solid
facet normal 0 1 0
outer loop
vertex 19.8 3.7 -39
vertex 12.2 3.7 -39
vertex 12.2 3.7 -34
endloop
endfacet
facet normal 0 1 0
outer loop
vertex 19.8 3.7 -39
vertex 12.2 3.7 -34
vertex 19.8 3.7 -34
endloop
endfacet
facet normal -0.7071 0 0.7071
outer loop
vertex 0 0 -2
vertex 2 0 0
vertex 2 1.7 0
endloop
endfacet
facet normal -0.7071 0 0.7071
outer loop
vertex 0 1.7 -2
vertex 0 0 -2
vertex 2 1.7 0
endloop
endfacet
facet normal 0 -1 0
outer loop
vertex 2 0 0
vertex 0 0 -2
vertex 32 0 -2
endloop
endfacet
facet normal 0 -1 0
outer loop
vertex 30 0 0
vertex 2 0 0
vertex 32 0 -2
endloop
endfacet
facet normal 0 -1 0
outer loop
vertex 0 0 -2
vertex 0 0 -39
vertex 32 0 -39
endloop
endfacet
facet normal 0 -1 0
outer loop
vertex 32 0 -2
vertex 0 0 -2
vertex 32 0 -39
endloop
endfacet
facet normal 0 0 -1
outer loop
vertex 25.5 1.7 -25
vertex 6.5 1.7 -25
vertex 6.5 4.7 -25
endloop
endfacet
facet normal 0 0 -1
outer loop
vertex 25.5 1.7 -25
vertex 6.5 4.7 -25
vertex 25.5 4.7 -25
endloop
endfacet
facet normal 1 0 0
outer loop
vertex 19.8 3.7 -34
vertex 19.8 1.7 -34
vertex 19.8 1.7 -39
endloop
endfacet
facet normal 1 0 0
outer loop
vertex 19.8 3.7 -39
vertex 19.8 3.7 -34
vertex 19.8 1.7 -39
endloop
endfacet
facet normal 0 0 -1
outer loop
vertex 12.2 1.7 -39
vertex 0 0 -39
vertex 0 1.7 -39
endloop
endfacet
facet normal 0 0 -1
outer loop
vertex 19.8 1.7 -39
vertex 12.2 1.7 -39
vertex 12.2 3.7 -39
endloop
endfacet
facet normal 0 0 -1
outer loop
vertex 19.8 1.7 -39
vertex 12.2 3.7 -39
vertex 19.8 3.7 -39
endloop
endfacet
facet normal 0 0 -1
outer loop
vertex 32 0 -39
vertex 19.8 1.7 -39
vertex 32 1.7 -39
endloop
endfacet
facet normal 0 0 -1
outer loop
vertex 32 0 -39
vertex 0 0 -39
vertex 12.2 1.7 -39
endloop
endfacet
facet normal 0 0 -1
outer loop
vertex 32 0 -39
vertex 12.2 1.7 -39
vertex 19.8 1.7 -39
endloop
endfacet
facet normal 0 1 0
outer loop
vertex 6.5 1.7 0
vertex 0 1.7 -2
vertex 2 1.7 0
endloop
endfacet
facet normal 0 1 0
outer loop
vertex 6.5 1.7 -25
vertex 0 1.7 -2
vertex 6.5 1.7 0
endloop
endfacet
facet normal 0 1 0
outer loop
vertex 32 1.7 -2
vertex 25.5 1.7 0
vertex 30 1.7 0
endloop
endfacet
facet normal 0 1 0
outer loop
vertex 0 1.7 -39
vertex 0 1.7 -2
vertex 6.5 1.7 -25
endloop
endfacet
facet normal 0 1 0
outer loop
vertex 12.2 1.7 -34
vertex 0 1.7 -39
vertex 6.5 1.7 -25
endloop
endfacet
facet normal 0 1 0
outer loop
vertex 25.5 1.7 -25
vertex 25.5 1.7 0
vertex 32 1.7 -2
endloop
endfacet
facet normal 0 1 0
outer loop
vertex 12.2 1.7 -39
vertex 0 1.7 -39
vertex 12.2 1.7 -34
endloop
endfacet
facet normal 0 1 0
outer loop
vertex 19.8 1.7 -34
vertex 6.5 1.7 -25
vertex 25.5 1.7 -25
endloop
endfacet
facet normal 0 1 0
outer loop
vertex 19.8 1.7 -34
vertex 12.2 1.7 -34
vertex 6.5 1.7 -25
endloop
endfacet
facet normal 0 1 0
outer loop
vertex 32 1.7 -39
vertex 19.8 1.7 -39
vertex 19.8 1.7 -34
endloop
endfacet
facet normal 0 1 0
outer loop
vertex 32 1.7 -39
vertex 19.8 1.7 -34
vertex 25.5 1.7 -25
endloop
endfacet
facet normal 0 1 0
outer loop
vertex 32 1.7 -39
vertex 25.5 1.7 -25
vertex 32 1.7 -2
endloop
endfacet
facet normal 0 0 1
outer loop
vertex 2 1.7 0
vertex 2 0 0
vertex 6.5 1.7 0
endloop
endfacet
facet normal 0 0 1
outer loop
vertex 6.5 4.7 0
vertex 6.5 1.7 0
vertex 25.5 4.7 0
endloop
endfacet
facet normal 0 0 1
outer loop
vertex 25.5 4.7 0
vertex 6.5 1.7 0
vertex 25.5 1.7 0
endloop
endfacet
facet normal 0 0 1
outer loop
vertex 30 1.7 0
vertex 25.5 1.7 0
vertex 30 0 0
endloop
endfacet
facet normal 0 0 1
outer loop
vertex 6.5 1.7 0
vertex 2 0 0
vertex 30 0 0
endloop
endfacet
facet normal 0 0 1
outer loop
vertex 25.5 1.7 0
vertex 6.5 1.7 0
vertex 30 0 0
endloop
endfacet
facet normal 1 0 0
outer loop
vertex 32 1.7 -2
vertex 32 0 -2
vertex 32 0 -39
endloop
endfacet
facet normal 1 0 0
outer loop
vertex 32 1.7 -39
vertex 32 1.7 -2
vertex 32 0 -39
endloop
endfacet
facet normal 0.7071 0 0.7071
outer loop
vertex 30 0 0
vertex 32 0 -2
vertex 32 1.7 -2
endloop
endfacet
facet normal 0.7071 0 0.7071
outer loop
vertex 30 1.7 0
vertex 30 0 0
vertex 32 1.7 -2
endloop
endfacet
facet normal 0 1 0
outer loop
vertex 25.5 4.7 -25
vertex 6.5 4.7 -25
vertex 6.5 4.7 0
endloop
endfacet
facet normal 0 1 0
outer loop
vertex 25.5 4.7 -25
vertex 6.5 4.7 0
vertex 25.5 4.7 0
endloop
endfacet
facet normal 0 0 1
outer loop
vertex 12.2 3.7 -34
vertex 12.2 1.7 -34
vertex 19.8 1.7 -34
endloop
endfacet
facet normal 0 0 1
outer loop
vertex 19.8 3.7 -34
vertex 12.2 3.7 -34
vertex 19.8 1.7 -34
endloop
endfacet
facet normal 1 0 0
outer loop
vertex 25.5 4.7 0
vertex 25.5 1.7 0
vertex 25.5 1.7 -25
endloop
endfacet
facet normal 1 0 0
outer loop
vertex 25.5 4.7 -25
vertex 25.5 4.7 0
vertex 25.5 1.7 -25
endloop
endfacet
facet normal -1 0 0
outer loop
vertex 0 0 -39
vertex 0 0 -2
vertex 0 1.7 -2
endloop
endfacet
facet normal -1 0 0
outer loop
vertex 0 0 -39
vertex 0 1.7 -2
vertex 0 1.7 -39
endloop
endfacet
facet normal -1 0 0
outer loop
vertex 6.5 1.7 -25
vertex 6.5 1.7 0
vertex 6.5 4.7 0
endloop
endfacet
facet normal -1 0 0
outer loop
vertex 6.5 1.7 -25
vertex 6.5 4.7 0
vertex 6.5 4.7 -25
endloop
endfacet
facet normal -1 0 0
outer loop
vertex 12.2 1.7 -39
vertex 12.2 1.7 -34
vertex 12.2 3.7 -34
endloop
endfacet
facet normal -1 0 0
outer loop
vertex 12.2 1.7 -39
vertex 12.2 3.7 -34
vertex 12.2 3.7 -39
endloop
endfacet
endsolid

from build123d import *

# Parameters (mm, degrees)
SKETCH1_W           = 32
SKETCH1_H           = 39
BOSS_EXTRUDE1_DEPTH = 1.7
CHAMFER1_SIZE       = 2
SKETCH3_W           = 19
SKETCH3_H           = 25
BOSS_EXTRUDE2_DEPTH = 3
SKETCH4_W           = 7.6
SKETCH4_H           = 5
BOSS_EXTRUDE3_DEPTH = 2


with BuildPart() as part:
    # Sketch1 → Boss-Extrude1 (new body)
    with BuildSketch(Plane(origin=(0, 0, 0), x_dir=(1, 0, 0), z_dir=(0, 1, 0))):
        with Locations((16, 19.5)):
            Rectangle(SKETCH1_W, SKETCH1_H)
    extrude(amount=BOSS_EXTRUDE1_DEPTH)

    # Chamfer1
    chamfer1_edges = [part.edges().sort_by_distance(p)[0] for p in [
        (32, 0.85, 0),
        (0, 0.85, 0),
    ]]
    chamfer(chamfer1_edges, length=CHAMFER1_SIZE)

    # Sketch3 → Boss-Extrude2 (add)
    with BuildSketch(Plane(origin=(0, 1.7, 0), x_dir=(1, 0, 0), z_dir=(0, 1, 0))):
        with Locations((16, 12.5)):
            Rectangle(SKETCH3_W, SKETCH3_H)
    extrude(amount=BOSS_EXTRUDE2_DEPTH)

    # Sketch4 → Boss-Extrude3 (add)
    with BuildSketch(Plane(origin=(0, 1.7, 0), x_dir=(1, 0, 0), z_dir=(0, 1, 0))):
        with Locations((16, 36.5)):
            Rectangle(SKETCH4_W, SKETCH4_H)
    extrude(amount=BOSS_EXTRUDE3_DEPTH)


solid = part.part
